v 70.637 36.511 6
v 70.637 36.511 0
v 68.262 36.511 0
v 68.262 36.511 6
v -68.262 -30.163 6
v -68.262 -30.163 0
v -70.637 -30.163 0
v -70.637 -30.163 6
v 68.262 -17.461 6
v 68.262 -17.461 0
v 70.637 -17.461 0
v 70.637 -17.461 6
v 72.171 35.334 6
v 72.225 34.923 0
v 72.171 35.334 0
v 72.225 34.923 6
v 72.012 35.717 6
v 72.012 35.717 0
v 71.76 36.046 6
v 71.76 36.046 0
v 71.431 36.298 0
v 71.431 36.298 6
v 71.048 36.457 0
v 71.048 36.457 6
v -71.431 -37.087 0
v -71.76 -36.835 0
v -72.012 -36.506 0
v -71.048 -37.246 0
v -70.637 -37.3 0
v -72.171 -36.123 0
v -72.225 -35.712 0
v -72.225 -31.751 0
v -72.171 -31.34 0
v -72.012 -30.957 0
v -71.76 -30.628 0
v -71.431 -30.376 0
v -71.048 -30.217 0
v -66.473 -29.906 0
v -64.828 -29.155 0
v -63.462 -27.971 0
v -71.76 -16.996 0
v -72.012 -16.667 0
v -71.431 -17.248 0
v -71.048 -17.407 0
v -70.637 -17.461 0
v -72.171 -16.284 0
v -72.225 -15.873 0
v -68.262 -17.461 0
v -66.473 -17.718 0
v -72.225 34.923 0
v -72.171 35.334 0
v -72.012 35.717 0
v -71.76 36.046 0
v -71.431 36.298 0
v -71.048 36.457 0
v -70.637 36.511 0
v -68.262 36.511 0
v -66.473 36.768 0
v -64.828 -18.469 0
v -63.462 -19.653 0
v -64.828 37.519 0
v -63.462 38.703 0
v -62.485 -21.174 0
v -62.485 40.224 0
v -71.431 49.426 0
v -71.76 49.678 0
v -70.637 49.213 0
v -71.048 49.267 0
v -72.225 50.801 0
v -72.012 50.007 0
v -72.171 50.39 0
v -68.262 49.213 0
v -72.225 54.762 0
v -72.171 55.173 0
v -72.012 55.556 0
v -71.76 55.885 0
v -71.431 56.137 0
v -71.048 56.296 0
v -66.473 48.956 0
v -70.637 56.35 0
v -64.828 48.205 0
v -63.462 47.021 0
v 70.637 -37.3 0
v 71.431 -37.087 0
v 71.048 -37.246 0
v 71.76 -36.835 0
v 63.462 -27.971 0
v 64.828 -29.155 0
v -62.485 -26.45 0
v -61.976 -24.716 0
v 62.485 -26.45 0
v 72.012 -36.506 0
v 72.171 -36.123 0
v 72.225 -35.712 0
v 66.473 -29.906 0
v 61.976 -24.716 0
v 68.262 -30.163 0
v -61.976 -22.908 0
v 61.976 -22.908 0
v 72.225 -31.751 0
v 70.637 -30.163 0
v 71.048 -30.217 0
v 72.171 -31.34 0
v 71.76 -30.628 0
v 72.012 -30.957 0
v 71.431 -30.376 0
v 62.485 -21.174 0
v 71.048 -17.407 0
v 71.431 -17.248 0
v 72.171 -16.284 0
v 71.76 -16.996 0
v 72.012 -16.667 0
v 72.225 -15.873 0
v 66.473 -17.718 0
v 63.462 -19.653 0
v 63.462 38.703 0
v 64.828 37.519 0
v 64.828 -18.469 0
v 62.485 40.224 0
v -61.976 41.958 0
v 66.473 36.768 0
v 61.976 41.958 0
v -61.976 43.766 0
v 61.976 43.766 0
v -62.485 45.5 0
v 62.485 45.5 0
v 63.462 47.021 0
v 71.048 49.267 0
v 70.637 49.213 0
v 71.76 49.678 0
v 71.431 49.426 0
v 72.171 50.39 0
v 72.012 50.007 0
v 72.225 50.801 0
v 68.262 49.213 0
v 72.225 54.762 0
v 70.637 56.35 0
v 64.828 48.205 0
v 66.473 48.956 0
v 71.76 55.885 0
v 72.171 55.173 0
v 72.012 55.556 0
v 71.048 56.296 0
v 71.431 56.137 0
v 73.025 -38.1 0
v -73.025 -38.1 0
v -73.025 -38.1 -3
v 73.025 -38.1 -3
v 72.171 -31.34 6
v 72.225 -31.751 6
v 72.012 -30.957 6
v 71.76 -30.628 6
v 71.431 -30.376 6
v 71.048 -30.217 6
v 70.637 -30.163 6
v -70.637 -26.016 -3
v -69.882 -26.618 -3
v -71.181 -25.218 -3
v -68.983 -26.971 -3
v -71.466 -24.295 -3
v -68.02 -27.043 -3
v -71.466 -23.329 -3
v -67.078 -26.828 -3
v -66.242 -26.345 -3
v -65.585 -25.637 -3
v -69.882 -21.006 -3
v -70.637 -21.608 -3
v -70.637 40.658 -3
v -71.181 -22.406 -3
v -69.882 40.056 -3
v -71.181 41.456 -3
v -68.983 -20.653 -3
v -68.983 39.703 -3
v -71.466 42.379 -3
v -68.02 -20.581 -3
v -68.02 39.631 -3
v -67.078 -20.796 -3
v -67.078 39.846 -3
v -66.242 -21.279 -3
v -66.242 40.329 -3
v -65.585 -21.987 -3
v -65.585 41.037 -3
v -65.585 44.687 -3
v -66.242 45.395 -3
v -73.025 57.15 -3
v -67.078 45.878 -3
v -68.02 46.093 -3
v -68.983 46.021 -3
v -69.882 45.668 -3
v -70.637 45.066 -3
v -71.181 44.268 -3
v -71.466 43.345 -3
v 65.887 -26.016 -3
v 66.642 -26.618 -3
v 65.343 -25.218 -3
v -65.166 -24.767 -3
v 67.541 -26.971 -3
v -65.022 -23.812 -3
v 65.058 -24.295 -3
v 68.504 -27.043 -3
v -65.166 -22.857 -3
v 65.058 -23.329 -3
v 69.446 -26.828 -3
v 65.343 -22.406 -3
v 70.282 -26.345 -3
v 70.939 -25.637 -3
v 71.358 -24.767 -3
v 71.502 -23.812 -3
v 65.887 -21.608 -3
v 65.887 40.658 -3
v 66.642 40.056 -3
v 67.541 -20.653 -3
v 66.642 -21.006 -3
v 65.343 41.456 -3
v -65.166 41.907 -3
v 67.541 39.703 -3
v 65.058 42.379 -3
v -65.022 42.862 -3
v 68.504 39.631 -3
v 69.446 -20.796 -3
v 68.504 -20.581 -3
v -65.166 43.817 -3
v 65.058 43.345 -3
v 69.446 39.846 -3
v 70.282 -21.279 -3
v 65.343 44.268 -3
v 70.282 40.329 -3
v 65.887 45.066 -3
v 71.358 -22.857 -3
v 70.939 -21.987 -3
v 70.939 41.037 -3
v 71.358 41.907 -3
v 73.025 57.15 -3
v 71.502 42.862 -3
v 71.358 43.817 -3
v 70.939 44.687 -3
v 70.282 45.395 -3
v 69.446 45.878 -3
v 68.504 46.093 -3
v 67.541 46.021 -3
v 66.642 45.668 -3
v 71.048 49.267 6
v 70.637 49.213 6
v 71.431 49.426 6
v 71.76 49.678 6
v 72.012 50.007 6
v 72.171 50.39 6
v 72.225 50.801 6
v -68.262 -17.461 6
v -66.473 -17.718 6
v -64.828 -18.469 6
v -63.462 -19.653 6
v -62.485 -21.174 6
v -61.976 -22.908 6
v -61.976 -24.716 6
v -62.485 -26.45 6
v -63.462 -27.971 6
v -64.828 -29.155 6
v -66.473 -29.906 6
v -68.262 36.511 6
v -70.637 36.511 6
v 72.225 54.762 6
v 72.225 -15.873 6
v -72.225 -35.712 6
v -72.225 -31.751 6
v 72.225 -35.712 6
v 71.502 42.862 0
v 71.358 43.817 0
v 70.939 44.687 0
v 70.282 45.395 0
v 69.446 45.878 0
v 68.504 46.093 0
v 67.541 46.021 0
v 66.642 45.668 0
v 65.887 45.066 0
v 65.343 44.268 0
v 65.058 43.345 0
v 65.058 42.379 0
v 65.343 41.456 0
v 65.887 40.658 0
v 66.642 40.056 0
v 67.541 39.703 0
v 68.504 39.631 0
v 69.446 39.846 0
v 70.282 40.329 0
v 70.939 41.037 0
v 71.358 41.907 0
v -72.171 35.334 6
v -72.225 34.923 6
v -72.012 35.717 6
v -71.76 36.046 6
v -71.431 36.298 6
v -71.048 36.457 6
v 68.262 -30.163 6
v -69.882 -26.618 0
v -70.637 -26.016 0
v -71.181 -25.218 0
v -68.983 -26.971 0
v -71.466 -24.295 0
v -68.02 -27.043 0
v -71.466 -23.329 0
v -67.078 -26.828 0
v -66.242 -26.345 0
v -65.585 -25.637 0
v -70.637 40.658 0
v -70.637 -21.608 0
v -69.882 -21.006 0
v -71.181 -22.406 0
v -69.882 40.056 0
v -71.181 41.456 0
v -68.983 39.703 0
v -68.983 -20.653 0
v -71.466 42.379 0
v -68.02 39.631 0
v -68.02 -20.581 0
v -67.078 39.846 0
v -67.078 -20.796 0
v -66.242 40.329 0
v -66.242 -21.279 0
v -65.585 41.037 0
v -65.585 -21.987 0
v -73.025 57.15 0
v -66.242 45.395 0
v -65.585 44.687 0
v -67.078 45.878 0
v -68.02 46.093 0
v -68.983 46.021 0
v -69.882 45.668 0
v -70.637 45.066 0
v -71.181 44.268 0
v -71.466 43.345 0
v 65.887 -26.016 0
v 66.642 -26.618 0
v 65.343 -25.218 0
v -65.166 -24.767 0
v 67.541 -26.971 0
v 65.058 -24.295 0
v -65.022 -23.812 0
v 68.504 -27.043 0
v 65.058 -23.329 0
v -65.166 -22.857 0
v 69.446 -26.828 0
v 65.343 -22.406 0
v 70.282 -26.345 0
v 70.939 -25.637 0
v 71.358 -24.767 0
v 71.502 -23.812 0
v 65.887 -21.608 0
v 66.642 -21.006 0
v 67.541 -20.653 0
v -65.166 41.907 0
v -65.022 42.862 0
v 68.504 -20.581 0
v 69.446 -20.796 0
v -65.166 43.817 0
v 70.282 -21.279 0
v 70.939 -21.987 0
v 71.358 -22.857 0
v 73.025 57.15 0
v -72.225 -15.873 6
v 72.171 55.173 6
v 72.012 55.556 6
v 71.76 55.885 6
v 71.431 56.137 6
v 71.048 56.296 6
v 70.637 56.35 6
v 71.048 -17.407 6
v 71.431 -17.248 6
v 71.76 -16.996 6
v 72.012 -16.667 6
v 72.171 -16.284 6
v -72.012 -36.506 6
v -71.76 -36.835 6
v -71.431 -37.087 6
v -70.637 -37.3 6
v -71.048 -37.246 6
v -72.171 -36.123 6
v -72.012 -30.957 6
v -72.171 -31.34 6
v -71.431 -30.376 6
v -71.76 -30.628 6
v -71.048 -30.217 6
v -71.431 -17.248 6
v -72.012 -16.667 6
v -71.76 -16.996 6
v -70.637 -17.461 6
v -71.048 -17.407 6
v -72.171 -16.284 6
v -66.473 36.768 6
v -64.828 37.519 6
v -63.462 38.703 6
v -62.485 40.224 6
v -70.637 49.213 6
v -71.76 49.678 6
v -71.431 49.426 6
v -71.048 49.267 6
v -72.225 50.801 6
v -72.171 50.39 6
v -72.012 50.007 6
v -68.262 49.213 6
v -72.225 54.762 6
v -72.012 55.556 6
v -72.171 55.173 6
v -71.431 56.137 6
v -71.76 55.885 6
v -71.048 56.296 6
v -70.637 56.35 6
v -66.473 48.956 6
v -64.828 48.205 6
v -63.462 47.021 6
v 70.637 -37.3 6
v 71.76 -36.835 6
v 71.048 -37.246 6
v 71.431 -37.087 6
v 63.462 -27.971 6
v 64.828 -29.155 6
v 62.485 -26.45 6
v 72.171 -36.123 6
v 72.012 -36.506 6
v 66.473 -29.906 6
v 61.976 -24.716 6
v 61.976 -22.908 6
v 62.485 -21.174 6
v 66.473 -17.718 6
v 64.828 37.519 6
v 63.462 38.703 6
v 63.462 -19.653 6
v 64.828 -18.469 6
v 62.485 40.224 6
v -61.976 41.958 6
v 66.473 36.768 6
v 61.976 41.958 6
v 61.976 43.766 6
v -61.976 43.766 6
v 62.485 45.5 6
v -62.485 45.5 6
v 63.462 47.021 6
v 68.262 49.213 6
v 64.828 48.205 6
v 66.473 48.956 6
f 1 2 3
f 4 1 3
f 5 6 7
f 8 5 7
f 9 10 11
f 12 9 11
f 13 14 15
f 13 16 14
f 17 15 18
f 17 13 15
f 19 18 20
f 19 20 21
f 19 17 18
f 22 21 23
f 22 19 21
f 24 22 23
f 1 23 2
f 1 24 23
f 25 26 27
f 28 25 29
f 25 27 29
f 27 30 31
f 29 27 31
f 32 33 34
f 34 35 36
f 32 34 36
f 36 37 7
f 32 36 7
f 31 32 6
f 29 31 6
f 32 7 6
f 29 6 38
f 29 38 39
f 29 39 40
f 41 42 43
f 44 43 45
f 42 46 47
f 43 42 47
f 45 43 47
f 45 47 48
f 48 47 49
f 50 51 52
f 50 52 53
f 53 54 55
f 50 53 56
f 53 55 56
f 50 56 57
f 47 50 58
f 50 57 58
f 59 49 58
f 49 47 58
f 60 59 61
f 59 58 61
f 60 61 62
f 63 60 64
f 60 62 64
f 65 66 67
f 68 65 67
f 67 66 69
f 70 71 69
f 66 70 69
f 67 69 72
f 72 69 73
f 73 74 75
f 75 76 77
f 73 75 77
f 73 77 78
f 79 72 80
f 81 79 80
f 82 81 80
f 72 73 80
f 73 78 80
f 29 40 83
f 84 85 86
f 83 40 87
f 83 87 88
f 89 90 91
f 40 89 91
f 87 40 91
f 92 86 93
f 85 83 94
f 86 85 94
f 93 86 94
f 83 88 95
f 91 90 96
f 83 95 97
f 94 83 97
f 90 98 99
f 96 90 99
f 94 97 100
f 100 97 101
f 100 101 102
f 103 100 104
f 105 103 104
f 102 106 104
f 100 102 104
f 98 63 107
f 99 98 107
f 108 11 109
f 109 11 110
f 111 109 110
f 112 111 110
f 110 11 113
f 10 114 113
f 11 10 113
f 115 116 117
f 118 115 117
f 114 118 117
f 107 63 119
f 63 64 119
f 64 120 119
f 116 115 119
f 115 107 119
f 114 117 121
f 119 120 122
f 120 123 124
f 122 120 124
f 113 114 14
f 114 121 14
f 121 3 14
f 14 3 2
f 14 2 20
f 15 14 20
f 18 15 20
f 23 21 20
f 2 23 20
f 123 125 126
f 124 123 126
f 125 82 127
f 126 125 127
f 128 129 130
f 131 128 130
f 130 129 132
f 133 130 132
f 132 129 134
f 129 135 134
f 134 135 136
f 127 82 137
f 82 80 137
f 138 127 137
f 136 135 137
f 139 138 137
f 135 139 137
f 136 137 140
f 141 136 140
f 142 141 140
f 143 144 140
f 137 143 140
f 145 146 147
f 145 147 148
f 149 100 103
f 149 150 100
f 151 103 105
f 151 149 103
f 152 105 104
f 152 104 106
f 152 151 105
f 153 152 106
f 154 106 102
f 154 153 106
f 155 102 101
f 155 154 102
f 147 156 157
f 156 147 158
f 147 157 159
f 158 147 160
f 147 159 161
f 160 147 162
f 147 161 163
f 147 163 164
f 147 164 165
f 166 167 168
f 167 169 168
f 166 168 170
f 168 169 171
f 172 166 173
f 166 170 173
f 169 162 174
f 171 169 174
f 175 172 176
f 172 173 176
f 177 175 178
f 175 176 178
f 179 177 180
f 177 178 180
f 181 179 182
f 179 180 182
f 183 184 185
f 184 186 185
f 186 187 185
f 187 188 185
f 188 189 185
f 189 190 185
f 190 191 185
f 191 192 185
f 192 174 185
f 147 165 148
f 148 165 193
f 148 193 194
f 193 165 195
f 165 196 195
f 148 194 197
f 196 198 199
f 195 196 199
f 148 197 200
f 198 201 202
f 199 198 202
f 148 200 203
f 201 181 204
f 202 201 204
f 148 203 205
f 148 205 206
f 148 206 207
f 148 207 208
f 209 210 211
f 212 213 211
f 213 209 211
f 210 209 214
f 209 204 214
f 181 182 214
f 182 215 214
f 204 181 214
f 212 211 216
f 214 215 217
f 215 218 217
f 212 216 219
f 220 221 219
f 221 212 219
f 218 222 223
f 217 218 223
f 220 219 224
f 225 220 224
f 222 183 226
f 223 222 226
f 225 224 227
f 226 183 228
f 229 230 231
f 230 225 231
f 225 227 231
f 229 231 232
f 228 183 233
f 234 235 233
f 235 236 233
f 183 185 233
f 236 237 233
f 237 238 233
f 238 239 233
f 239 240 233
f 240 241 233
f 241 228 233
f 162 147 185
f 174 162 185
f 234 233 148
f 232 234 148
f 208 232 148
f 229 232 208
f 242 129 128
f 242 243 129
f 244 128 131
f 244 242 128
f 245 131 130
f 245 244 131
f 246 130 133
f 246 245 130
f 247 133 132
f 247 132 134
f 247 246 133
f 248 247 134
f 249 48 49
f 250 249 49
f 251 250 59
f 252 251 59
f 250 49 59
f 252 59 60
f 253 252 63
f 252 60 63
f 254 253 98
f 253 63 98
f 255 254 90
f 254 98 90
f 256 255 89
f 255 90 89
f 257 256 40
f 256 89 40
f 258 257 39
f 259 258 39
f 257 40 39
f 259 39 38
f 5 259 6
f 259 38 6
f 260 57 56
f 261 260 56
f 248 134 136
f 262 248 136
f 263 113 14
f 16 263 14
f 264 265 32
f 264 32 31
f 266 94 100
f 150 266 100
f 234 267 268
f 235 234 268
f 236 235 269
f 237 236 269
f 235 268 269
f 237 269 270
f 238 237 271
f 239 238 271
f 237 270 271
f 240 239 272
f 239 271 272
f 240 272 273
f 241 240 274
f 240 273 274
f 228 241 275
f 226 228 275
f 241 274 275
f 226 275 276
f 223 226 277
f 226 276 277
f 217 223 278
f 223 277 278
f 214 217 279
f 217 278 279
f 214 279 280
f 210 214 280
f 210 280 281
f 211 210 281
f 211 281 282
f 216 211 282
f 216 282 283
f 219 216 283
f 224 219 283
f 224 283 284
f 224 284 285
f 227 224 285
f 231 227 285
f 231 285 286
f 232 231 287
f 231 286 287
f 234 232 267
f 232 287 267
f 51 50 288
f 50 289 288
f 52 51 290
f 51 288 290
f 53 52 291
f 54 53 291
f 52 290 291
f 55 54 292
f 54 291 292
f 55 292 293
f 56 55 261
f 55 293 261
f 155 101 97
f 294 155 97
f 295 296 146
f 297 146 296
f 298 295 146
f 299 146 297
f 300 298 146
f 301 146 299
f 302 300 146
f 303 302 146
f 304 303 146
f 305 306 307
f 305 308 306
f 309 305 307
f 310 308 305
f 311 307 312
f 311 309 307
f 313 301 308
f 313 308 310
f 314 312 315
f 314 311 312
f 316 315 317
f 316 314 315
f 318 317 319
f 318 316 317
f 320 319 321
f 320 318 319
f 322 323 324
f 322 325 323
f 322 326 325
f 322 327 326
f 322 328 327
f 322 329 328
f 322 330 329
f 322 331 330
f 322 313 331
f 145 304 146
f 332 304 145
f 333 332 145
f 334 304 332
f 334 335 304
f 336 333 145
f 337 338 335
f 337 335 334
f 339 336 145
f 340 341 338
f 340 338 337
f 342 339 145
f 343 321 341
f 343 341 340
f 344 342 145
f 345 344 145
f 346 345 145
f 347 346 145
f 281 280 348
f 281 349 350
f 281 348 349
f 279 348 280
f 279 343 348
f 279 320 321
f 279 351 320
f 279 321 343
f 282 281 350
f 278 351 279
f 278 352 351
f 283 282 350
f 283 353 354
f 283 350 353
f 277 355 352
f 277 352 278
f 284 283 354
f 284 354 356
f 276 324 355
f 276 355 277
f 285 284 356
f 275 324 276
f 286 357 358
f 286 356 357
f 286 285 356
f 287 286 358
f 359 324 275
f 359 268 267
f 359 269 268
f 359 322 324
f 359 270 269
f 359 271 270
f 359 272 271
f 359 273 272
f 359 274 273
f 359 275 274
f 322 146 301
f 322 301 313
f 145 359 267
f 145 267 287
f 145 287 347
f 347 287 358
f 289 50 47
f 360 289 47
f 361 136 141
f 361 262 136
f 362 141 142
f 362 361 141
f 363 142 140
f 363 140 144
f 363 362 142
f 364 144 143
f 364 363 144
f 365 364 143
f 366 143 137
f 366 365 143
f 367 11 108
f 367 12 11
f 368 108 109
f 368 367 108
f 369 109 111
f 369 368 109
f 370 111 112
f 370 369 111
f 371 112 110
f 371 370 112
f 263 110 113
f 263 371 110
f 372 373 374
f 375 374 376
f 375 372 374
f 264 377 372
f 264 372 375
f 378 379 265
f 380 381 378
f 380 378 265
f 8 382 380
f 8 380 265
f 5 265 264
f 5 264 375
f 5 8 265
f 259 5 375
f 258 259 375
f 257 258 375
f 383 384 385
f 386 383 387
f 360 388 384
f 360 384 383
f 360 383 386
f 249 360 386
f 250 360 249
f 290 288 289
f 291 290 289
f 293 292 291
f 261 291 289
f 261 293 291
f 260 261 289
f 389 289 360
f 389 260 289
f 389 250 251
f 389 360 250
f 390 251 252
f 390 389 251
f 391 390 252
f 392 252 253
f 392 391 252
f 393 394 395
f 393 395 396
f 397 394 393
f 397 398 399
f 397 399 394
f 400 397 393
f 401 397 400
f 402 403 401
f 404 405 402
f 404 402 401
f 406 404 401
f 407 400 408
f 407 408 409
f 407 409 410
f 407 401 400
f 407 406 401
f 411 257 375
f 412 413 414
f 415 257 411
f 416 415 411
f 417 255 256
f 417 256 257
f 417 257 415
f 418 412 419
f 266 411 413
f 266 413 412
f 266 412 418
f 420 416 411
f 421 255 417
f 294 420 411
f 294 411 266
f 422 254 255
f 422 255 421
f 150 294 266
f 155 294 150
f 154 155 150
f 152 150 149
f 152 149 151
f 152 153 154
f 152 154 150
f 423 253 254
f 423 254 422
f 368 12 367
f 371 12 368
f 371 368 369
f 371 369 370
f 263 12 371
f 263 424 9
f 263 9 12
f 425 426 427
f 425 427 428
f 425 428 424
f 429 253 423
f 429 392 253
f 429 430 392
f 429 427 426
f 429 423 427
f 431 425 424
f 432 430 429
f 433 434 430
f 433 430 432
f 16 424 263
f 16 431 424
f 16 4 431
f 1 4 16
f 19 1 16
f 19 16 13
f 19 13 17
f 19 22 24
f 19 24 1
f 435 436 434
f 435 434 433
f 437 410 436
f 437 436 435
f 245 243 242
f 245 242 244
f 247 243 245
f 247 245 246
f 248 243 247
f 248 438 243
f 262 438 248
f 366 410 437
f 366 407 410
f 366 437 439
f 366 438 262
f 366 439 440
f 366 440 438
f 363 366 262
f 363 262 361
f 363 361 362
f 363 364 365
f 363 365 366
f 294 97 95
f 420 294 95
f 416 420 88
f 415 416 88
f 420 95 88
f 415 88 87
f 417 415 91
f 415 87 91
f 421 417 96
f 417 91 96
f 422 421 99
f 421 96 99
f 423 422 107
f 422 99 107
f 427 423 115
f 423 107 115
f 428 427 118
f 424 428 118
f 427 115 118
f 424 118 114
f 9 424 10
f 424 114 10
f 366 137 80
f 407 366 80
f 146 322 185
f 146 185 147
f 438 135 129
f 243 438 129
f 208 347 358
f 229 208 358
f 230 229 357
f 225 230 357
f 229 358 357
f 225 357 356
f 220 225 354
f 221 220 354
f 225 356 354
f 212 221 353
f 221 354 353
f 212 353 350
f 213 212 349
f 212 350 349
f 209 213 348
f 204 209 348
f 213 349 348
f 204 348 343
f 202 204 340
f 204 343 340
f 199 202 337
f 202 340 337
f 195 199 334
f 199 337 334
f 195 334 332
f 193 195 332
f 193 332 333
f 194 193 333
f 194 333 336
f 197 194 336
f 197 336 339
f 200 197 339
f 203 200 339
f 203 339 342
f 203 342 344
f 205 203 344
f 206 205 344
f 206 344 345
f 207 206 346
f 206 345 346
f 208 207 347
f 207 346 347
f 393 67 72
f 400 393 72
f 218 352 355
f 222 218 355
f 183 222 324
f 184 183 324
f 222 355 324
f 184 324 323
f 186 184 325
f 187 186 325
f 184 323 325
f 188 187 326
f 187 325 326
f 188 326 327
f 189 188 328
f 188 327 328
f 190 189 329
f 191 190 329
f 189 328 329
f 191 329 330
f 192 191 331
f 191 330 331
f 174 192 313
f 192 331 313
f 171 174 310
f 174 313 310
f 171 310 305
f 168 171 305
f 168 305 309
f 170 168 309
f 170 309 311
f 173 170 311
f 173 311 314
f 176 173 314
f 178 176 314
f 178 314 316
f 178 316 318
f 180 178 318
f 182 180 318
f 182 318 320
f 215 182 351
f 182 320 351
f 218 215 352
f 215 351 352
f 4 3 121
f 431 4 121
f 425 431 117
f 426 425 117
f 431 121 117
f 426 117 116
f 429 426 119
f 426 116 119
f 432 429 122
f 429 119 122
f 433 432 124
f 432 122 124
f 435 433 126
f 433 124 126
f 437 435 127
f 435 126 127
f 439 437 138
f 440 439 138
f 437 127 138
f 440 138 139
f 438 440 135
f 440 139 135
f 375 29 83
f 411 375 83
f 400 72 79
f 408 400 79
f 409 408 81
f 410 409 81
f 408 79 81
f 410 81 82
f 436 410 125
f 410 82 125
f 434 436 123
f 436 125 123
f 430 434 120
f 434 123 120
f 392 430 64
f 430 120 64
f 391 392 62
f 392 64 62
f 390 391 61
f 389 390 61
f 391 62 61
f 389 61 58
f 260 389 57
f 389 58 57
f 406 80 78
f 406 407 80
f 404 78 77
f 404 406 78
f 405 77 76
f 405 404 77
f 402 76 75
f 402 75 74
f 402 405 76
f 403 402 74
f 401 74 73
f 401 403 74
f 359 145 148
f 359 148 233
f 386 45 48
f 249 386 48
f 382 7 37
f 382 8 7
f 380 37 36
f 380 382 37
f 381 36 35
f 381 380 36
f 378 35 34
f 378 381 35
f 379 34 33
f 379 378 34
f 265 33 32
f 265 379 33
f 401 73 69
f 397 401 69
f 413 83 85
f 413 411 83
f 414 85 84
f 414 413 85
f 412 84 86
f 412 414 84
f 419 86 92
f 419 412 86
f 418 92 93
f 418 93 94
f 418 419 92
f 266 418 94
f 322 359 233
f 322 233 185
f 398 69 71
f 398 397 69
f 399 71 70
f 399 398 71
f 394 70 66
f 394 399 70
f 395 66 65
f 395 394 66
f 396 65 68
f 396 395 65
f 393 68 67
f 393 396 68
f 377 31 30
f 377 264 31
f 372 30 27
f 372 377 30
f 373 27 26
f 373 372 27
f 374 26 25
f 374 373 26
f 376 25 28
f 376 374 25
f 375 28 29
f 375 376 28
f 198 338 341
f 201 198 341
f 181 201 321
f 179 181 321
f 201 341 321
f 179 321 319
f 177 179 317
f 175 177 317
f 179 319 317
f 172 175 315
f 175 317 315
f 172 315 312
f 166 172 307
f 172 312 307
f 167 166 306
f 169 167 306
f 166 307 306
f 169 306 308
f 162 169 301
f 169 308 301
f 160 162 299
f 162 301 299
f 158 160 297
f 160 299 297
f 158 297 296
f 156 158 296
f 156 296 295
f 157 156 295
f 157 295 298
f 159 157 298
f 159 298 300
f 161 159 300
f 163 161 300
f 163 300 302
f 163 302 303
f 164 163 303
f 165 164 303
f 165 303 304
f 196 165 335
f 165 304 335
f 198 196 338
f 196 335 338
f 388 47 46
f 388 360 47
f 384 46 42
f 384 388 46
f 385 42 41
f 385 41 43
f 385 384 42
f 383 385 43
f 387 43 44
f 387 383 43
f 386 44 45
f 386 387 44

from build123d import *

# Parameters (mm, degrees)
F0_R     = 3.24
F1_DEPTH = 3
F2_DEPTH = 6
F3_R     = 1.588


# Not quite as in the source:
# - a feature names something its author has since deleted; it is built from what else it names


with BuildPart() as f1:
    # F0 (on Top) → F1 (new body)
    with BuildSketch(Plane.XY):
        Polygon((0, 57.15), (-73.025, 57.15), (-73.025, 9.525), (-73.025, -38.1), (73.025, -38.1), (73.025, 57.15), align=None)
        with Locations((-68.262, -23.812)):
            Circle(F0_R, mode=Mode.SUBTRACT)
        with Locations((68.262, -23.812)):
            Circle(F0_R, mode=Mode.SUBTRACT)
        with Locations((-68.262, 42.862)):
            Circle(F0_R, mode=Mode.SUBTRACT)
        with BuildLine():
            Line((-72.225, -17.461), (-72.225, 9.525))
            Line((-72.225, 9.525), (-72.225, 36.511))
            Line((-72.225, 36.511), (-68.262, 36.511))
            ThreePointArc((-68.262, 36.511), (-61.911, 42.862), (-68.262, 49.213))
            Line((-68.262, 49.213), (-72.225, 49.213))
            Line((-72.225, 49.213), (-72.225, 56.35))
            Line((-72.225, 56.35), (72.225, 56.35))
            Line((72.225, 56.35), (72.225, 49.213))
            Line((72.225, 49.213), (68.262, 49.213))
            ThreePointArc((68.262, 49.213), (61.911, 42.862), (68.262, 36.511))
            Line((68.262, 36.511), (72.225, 36.511))
            Line((72.225, 36.511), (72.225, -17.461))
            Line((72.225, -17.461), (68.262, -17.461))
            ThreePointArc((68.262, -17.461), (61.911, -23.812), (68.262, -30.163))
            Line((68.262, -30.163), (72.225, -30.163))
            Line((72.225, -30.163), (72.225, -37.3))
            Line((72.225, -37.3), (-72.225, -37.3))
            Line((-72.225, -37.3), (-72.225, -30.163))
            Line((-72.225, -30.163), (-68.262, -30.163))
            ThreePointArc((-68.262, -30.163), (-61.911, -23.812), (-68.262, -17.461))
            Line((-68.262, -17.461), (-72.225, -17.461))
        make_face(mode=Mode.SUBTRACT)
        with Locations((68.262, 42.862)):
            Circle(F0_R, mode=Mode.SUBTRACT)
        with BuildLine():
            Line((-72.225, 36.511), (-72.225, 9.525))
            Line((-72.225, 9.525), (-72.225, -17.461))
            Line((-72.225, -17.461), (-68.262, -17.461))
            ThreePointArc((-68.262, -17.461), (-61.911, -23.812), (-68.262, -30.163))
            Line((-68.262, -30.163), (-72.225, -30.163))
            Line((-72.225, -30.163), (-72.225, -37.3))
            Line((-72.225, -37.3), (72.225, -37.3))
            Line((72.225, -37.3), (72.225, -30.163))
            Line((72.225, -30.163), (68.262, -30.163))
            ThreePointArc((68.262, -30.163), (61.911, -23.812), (68.262, -17.461))
            Line((68.262, -17.461), (72.225, -17.461))
            Line((72.225, -17.461), (72.225, 36.511))
            Line((72.225, 36.511), (68.262, 36.511))
            ThreePointArc((68.262, 36.511), (61.911, 42.862), (68.262, 49.213))
            Line((68.262, 49.213), (72.225, 49.213))
            Line((72.225, 49.213), (72.225, 56.35))
            Line((72.225, 56.35), (-72.225, 56.35))
            Line((-72.225, 56.35), (-72.225, 49.213))
            Line((-72.225, 49.213), (-68.262, 49.213))
            ThreePointArc((-68.262, 49.213), (-61.911, 42.862), (-68.262, 36.511))
            Line((-68.262, 36.511), (-72.225, 36.511))
        make_face()
    extrude(amount=-F1_DEPTH)


with BuildPart() as f2:
    # F0 (on Top) → F2 (new body)
    with BuildSketch(Plane.XY):
        with BuildLine():
            Line((-72.225, 36.511), (-72.225, 9.525))
            Line((-72.225, 9.525), (-72.225, -17.461))
            Line((-72.225, -17.461), (-68.262, -17.461))
            ThreePointArc((-68.262, -17.461), (-61.911, -23.812), (-68.262, -30.163))
            Line((-68.262, -30.163), (-72.225, -30.163))
            Line((-72.225, -30.163), (-72.225, -37.3))
            Line((-72.225, -37.3), (72.225, -37.3))
            Line((72.225, -37.3), (72.225, -30.163))
            Line((72.225, -30.163), (68.262, -30.163))
            ThreePointArc((68.262, -30.163), (61.911, -23.812), (68.262, -17.461))
            Line((68.262, -17.461), (72.225, -17.461))
            Line((72.225, -17.461), (72.225, 36.511))
            Line((72.225, 36.511), (68.262, 36.511))
            ThreePointArc((68.262, 36.511), (61.911, 42.862), (68.262, 49.213))
            Line((68.262, 49.213), (72.225, 49.213))
            Line((72.225, 49.213), (72.225, 56.35))
            Line((72.225, 56.35), (-72.225, 56.35))
            Line((-72.225, 56.35), (-72.225, 49.213))
            Line((-72.225, 49.213), (-68.262, 49.213))
            ThreePointArc((-68.262, 49.213), (-61.911, 42.862), (-68.262, 36.511))
            Line((-68.262, 36.511), (-72.225, 36.511))
        make_face()
    extrude(amount=F2_DEPTH)

    # F3
    f3_edges = [f2.edges().sort_by_distance(p)[0] for p in [
        (-72.225, 56.35, 3),
        (-72.225, -37.3, 3),
        (72.225, -37.3, 3),
        (72.225, 56.35, 3),
        (-72.225, 36.511, 3),
        (-72.225, -17.461, 3),
        (-72.225, 49.213, 3),
        (72.225, 49.213, 3),
        (72.225, 36.511, 3),
        (72.225, -17.461, 3),
        (72.225, -30.163, 3),
        (-72.225, -30.163, 3),
    ]]
    fillet(f3_edges, radius=F3_R)


solid = Compound([f1.part, f2.part])
